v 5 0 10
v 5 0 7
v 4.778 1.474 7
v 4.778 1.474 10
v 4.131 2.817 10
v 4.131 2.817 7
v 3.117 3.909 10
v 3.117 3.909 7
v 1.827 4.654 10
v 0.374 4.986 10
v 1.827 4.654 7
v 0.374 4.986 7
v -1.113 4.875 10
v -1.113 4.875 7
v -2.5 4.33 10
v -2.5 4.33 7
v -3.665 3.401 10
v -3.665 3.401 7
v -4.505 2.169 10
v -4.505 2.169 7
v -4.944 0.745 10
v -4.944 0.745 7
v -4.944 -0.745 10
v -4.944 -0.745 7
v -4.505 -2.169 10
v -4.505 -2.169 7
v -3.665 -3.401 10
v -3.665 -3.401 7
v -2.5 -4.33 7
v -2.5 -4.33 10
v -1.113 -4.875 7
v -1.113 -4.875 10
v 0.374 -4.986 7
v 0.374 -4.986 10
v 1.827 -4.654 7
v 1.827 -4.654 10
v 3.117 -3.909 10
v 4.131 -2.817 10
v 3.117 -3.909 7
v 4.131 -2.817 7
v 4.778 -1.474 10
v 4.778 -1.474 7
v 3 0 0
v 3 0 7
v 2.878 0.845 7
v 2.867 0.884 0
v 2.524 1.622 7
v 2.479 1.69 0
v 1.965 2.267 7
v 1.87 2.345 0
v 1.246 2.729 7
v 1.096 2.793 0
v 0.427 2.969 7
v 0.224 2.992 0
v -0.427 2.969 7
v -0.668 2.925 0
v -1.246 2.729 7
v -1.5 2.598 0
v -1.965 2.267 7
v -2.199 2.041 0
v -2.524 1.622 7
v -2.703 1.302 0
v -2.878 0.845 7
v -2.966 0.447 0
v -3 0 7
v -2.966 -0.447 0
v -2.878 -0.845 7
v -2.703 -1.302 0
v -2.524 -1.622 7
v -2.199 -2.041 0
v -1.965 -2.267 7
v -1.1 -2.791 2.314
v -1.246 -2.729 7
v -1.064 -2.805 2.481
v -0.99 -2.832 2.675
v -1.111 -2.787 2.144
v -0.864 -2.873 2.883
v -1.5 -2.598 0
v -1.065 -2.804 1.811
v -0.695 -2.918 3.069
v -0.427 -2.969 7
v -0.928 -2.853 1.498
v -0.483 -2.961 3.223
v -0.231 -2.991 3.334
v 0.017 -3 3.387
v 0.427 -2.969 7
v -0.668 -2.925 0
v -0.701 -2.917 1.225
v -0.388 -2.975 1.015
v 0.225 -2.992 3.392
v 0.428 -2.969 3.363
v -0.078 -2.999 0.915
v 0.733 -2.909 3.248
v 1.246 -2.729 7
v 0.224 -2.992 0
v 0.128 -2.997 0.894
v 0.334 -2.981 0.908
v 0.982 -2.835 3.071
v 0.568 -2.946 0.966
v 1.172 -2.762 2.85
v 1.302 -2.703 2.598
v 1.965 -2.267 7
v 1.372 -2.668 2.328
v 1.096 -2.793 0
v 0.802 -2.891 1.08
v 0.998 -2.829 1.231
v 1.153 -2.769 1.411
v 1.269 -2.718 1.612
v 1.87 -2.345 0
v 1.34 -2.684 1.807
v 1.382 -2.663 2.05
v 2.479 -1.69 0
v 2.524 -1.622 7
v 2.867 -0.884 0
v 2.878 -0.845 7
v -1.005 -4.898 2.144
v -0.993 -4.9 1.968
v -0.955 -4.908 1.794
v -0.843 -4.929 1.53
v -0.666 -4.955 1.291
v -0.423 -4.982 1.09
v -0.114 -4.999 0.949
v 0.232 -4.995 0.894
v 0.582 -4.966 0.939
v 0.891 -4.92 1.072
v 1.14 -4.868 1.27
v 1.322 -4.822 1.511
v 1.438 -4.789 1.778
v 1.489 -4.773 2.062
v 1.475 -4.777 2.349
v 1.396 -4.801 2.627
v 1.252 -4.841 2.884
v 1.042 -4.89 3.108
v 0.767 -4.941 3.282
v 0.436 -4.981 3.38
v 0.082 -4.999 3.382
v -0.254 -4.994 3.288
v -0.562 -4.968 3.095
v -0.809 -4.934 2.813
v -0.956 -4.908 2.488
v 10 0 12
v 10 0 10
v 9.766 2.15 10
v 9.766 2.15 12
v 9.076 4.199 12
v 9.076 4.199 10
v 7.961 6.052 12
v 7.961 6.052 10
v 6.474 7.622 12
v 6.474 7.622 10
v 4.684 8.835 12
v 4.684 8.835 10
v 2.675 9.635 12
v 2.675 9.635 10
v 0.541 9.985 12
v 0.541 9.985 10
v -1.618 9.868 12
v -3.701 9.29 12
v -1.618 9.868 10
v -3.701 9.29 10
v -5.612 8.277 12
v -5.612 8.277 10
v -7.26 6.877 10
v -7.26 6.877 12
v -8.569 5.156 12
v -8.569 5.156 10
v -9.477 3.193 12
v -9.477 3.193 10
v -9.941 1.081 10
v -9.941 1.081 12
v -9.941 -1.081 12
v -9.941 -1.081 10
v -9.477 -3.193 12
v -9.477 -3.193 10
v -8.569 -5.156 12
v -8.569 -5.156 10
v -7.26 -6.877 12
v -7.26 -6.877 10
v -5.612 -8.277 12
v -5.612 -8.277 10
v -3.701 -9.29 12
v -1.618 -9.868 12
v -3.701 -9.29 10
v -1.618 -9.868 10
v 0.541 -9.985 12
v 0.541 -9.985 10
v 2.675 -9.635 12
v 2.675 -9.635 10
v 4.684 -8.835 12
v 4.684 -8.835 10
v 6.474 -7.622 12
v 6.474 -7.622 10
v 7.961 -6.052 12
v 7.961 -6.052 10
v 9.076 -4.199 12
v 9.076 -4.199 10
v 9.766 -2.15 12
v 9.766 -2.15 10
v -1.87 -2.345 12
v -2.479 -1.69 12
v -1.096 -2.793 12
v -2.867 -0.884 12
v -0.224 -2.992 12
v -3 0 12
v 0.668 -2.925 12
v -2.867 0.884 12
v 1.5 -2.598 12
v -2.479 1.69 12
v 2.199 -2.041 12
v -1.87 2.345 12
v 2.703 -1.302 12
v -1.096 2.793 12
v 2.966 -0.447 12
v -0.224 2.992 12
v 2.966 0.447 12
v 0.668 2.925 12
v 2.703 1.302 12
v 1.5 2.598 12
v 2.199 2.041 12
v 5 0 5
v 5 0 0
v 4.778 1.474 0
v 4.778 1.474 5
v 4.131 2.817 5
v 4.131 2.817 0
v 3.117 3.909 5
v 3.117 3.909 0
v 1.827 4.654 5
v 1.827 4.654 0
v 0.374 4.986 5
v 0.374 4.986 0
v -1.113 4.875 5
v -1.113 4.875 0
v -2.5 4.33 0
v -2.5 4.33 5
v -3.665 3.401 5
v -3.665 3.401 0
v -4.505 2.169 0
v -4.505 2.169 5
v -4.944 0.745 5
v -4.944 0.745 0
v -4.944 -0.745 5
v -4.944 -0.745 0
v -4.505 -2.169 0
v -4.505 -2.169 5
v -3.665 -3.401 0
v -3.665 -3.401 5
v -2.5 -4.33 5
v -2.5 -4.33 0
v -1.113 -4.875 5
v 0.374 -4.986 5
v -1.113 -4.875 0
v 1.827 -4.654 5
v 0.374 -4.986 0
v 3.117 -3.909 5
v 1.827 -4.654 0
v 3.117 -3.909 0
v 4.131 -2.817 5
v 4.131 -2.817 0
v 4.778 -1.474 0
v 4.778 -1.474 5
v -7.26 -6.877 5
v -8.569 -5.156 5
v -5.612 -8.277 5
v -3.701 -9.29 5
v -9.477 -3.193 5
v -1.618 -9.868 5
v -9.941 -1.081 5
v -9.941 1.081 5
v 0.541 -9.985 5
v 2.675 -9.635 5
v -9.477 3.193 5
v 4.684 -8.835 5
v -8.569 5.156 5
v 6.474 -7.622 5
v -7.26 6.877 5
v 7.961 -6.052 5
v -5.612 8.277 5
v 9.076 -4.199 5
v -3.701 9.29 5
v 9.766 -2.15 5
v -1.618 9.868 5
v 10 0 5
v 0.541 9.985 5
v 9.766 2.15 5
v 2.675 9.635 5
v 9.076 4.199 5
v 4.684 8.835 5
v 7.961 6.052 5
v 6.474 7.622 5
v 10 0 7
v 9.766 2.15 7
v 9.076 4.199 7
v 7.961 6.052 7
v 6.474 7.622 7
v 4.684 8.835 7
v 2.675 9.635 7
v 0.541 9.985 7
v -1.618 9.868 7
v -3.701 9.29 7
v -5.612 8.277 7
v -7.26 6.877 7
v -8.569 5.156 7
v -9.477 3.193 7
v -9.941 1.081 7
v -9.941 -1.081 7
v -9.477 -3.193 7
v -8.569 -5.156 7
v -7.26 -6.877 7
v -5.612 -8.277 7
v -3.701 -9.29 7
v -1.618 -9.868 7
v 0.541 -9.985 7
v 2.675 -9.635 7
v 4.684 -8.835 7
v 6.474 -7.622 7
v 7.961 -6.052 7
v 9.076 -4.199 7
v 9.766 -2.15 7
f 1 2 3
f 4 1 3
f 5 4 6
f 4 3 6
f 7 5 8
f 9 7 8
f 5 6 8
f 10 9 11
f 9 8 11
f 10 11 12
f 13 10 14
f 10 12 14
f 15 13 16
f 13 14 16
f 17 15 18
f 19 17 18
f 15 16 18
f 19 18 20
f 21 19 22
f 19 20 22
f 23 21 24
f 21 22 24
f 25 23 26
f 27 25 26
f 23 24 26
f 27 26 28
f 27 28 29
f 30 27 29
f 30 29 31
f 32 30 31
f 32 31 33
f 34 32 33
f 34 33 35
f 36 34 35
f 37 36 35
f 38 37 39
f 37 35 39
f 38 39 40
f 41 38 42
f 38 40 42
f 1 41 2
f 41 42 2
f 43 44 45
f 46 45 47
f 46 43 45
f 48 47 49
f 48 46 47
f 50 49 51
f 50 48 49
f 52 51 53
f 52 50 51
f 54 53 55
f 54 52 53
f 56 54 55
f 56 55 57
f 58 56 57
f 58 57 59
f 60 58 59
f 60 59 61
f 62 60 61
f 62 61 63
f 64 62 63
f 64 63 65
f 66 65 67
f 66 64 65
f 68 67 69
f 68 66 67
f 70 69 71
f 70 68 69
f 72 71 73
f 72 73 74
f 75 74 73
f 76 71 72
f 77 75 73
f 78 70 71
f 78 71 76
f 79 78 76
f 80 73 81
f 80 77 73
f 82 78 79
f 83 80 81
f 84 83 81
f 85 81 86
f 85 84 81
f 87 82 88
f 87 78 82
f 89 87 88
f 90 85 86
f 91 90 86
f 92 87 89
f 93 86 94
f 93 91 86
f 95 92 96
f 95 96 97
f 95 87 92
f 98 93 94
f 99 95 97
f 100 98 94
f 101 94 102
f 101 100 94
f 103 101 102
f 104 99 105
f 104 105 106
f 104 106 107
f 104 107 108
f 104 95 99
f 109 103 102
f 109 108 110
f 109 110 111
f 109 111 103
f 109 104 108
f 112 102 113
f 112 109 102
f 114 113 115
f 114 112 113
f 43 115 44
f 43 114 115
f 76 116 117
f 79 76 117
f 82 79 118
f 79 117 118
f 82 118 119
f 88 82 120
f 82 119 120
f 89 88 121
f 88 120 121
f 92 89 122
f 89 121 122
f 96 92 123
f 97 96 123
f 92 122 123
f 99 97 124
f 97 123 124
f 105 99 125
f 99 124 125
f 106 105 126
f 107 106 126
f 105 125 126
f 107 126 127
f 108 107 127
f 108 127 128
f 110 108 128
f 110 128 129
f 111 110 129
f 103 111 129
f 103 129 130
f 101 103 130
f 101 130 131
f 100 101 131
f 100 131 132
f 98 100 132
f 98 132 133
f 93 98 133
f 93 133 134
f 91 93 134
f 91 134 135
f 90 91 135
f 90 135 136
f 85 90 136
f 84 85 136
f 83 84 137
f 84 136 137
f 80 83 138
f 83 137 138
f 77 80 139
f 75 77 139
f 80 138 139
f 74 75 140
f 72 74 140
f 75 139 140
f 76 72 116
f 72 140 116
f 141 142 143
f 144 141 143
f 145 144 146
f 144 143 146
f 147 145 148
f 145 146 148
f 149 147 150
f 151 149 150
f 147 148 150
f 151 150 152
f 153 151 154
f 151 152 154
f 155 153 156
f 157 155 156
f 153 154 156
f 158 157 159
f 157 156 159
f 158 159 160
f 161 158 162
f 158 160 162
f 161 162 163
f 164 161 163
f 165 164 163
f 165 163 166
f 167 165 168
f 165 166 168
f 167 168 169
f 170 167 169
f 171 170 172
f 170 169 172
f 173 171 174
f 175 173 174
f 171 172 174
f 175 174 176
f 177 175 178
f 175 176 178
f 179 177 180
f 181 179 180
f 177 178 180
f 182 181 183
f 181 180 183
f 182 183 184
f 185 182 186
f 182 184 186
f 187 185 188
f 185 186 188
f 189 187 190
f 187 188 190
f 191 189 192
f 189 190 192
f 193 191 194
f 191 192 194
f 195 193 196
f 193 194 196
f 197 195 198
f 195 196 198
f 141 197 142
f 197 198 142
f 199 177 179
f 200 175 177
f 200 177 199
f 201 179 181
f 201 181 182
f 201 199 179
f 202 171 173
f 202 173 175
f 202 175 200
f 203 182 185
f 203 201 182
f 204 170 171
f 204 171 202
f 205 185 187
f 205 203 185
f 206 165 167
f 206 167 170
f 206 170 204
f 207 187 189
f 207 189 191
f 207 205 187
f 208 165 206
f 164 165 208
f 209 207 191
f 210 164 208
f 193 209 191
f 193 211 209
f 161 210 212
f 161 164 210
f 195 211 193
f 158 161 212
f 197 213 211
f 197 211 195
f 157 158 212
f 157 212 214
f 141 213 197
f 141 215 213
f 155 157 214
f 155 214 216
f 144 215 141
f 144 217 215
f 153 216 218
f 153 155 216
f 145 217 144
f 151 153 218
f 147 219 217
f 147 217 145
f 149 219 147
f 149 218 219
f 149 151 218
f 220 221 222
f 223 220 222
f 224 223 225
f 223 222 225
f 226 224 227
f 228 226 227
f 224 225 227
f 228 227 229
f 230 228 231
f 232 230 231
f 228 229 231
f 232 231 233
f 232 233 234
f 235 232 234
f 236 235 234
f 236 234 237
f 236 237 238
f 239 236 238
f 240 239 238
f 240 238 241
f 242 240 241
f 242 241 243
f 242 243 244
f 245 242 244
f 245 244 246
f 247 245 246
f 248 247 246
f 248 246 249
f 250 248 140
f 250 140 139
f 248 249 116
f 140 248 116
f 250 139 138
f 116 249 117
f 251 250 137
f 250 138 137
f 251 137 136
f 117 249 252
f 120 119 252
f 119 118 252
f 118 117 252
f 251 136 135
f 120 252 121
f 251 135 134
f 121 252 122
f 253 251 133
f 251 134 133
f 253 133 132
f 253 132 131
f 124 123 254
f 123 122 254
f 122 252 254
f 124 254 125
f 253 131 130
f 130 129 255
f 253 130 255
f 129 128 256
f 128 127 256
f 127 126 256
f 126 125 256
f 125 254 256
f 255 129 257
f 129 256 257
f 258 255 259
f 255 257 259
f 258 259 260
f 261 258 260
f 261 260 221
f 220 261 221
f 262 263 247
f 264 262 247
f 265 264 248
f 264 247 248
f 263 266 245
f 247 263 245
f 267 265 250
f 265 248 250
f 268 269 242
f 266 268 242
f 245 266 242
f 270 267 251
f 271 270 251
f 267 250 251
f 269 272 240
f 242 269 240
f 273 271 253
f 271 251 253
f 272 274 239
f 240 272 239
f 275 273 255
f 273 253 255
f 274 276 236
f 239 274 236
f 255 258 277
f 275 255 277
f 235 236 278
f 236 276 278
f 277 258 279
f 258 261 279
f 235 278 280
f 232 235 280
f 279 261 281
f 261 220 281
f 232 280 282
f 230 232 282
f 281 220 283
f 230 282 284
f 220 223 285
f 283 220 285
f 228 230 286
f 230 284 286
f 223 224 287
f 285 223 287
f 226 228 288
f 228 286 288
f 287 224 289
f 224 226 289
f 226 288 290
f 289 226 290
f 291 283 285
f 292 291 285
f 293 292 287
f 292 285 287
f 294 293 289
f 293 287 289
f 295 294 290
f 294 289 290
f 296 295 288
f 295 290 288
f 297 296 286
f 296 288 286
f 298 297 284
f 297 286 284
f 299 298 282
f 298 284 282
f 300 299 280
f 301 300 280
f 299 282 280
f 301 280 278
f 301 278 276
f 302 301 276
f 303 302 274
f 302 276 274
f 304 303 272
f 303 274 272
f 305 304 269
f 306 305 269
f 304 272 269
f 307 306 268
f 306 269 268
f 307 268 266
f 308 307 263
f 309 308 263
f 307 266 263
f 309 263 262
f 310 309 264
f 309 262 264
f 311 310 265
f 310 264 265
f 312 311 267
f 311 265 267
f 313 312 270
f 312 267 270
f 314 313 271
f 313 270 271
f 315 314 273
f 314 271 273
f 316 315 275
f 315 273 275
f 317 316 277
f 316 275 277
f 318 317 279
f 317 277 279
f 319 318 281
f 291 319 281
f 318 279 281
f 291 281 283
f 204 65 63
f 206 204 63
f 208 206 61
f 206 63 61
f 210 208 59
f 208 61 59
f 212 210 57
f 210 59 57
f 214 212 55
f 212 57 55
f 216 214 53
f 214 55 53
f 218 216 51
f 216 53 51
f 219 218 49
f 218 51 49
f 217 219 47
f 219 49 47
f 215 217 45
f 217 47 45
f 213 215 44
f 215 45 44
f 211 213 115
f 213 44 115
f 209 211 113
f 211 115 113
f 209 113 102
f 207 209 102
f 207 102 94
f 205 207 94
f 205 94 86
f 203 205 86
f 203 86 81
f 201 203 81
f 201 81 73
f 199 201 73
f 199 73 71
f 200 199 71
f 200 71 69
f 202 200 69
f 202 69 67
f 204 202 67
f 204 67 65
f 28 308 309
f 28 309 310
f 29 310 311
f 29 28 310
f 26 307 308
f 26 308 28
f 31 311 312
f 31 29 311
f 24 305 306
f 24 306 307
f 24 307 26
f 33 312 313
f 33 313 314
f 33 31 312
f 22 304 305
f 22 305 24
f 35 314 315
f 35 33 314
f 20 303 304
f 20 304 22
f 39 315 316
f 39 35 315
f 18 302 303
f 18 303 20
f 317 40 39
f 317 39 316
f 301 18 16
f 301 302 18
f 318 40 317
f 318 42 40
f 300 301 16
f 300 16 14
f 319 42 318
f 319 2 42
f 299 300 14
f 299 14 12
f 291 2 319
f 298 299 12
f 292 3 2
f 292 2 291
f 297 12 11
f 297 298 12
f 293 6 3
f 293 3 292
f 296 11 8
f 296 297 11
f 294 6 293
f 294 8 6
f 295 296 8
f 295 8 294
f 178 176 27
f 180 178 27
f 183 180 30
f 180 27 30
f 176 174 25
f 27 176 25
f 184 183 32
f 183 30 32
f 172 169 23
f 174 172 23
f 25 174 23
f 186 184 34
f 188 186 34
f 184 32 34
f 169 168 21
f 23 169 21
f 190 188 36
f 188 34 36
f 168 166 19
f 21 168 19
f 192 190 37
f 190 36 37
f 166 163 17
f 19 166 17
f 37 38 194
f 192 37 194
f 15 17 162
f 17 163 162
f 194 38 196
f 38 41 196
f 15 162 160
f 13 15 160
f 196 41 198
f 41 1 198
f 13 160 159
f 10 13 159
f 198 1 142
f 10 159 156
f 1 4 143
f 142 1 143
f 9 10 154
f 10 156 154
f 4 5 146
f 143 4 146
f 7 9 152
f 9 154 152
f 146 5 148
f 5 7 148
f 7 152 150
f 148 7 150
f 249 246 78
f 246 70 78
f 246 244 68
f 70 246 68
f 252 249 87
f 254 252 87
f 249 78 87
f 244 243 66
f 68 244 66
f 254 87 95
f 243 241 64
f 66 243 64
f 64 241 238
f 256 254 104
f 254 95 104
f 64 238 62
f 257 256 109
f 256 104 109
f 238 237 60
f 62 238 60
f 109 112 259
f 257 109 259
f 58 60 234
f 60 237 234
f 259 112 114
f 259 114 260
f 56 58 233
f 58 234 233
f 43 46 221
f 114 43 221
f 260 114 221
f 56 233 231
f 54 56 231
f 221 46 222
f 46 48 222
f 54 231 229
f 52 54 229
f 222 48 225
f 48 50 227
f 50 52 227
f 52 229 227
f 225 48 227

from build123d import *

# Parameters (mm, degrees)
SKETCH_1_R          = 5
SKETCH_1_R_2        = 3
EXTRUDE_1_DEPTH     = 5
SKETCH_2_R          = 10
SKETCH_2_R_2        = 3
EXTRUDE_2_DEPTH     = 2
SKETCH_3_R          = 5
EXTRUDE_3_DEPTH     = 3
SKETCH_4_R          = 10
EXTRUDE_4_DEPTH     = 2
SKETCH_5_R          = 3
CUT_EXTRUDE_1_DEPTH = 16.779733838
M3X0_5_1_REACH      = 22.665
M3X0_5_1_BORE_R     = 1.25


with BuildPart() as part:
    # ｽｹｯﾁ1 → ﾎﾞｽ - 押し出し1 (new body)
    with BuildSketch(Plane.XY):
        Circle(SKETCH_1_R)
        Circle(SKETCH_1_R_2, mode=Mode.SUBTRACT)
    extrude(amount=EXTRUDE_1_DEPTH)

    # ｽｹｯﾁ2 → ﾎﾞｽ - 押し出し2 (add)
    with BuildSketch(Plane.XY.offset(5)):
        Circle(SKETCH_2_R)
        Circle(SKETCH_2_R_2, mode=Mode.SUBTRACT)
    extrude(amount=EXTRUDE_2_DEPTH)

    # ｽｹｯﾁ3 → ﾎﾞｽ - 押し出し3 (add)
    with BuildSketch(Plane.XY.offset(7)):
        Circle(SKETCH_3_R)
    extrude(amount=EXTRUDE_3_DEPTH)

    # ｽｹｯﾁ4 → ﾎﾞｽ - 押し出し4 (add)
    with BuildSketch(Plane.XY.offset(10)):
        Circle(SKETCH_4_R)
    extrude(amount=EXTRUDE_4_DEPTH)

    # ｽｹｯﾁ5 → ｶｯﾄ - 押し出し1 (cut, through all)
    with BuildSketch(Plane(origin=(0, 0, 7), x_dir=(-1, 0, 0), z_dir=(0, 0, -1))):
        Circle(SKETCH_5_R)
    extrude(amount=-CUT_EXTRUDE_1_DEPTH, mode=Mode.SUBTRACT)

    # M3x0.5 ねじ穴1 bore (on position points) → M3x0.5 ねじ穴1 (cut, up to next)
    with BuildSketch(Plane(origin=(0.251235543, -4.993684081, 2.143915345), x_dir=(-0.998736816219, -0.050247108654, 0), z_dir=(0.050247108654, -0.998736816219, 0)), mode=Mode.PRIVATE) as m3x0_5_1_sk1:
        Circle(M3X0_5_1_BORE_R)
    m3x0_5_1_tool1 = extrude(m3x0_5_1_sk1.sketch, amount=-M3X0_5_1_REACH, mode=Mode.PRIVATE) & part.part
    add(m3x0_5_1_tool1.solids().sort_by_distance((0.251236, -4.993684, 2.143915))[0], mode=Mode.SUBTRACT)


solid = part.part
